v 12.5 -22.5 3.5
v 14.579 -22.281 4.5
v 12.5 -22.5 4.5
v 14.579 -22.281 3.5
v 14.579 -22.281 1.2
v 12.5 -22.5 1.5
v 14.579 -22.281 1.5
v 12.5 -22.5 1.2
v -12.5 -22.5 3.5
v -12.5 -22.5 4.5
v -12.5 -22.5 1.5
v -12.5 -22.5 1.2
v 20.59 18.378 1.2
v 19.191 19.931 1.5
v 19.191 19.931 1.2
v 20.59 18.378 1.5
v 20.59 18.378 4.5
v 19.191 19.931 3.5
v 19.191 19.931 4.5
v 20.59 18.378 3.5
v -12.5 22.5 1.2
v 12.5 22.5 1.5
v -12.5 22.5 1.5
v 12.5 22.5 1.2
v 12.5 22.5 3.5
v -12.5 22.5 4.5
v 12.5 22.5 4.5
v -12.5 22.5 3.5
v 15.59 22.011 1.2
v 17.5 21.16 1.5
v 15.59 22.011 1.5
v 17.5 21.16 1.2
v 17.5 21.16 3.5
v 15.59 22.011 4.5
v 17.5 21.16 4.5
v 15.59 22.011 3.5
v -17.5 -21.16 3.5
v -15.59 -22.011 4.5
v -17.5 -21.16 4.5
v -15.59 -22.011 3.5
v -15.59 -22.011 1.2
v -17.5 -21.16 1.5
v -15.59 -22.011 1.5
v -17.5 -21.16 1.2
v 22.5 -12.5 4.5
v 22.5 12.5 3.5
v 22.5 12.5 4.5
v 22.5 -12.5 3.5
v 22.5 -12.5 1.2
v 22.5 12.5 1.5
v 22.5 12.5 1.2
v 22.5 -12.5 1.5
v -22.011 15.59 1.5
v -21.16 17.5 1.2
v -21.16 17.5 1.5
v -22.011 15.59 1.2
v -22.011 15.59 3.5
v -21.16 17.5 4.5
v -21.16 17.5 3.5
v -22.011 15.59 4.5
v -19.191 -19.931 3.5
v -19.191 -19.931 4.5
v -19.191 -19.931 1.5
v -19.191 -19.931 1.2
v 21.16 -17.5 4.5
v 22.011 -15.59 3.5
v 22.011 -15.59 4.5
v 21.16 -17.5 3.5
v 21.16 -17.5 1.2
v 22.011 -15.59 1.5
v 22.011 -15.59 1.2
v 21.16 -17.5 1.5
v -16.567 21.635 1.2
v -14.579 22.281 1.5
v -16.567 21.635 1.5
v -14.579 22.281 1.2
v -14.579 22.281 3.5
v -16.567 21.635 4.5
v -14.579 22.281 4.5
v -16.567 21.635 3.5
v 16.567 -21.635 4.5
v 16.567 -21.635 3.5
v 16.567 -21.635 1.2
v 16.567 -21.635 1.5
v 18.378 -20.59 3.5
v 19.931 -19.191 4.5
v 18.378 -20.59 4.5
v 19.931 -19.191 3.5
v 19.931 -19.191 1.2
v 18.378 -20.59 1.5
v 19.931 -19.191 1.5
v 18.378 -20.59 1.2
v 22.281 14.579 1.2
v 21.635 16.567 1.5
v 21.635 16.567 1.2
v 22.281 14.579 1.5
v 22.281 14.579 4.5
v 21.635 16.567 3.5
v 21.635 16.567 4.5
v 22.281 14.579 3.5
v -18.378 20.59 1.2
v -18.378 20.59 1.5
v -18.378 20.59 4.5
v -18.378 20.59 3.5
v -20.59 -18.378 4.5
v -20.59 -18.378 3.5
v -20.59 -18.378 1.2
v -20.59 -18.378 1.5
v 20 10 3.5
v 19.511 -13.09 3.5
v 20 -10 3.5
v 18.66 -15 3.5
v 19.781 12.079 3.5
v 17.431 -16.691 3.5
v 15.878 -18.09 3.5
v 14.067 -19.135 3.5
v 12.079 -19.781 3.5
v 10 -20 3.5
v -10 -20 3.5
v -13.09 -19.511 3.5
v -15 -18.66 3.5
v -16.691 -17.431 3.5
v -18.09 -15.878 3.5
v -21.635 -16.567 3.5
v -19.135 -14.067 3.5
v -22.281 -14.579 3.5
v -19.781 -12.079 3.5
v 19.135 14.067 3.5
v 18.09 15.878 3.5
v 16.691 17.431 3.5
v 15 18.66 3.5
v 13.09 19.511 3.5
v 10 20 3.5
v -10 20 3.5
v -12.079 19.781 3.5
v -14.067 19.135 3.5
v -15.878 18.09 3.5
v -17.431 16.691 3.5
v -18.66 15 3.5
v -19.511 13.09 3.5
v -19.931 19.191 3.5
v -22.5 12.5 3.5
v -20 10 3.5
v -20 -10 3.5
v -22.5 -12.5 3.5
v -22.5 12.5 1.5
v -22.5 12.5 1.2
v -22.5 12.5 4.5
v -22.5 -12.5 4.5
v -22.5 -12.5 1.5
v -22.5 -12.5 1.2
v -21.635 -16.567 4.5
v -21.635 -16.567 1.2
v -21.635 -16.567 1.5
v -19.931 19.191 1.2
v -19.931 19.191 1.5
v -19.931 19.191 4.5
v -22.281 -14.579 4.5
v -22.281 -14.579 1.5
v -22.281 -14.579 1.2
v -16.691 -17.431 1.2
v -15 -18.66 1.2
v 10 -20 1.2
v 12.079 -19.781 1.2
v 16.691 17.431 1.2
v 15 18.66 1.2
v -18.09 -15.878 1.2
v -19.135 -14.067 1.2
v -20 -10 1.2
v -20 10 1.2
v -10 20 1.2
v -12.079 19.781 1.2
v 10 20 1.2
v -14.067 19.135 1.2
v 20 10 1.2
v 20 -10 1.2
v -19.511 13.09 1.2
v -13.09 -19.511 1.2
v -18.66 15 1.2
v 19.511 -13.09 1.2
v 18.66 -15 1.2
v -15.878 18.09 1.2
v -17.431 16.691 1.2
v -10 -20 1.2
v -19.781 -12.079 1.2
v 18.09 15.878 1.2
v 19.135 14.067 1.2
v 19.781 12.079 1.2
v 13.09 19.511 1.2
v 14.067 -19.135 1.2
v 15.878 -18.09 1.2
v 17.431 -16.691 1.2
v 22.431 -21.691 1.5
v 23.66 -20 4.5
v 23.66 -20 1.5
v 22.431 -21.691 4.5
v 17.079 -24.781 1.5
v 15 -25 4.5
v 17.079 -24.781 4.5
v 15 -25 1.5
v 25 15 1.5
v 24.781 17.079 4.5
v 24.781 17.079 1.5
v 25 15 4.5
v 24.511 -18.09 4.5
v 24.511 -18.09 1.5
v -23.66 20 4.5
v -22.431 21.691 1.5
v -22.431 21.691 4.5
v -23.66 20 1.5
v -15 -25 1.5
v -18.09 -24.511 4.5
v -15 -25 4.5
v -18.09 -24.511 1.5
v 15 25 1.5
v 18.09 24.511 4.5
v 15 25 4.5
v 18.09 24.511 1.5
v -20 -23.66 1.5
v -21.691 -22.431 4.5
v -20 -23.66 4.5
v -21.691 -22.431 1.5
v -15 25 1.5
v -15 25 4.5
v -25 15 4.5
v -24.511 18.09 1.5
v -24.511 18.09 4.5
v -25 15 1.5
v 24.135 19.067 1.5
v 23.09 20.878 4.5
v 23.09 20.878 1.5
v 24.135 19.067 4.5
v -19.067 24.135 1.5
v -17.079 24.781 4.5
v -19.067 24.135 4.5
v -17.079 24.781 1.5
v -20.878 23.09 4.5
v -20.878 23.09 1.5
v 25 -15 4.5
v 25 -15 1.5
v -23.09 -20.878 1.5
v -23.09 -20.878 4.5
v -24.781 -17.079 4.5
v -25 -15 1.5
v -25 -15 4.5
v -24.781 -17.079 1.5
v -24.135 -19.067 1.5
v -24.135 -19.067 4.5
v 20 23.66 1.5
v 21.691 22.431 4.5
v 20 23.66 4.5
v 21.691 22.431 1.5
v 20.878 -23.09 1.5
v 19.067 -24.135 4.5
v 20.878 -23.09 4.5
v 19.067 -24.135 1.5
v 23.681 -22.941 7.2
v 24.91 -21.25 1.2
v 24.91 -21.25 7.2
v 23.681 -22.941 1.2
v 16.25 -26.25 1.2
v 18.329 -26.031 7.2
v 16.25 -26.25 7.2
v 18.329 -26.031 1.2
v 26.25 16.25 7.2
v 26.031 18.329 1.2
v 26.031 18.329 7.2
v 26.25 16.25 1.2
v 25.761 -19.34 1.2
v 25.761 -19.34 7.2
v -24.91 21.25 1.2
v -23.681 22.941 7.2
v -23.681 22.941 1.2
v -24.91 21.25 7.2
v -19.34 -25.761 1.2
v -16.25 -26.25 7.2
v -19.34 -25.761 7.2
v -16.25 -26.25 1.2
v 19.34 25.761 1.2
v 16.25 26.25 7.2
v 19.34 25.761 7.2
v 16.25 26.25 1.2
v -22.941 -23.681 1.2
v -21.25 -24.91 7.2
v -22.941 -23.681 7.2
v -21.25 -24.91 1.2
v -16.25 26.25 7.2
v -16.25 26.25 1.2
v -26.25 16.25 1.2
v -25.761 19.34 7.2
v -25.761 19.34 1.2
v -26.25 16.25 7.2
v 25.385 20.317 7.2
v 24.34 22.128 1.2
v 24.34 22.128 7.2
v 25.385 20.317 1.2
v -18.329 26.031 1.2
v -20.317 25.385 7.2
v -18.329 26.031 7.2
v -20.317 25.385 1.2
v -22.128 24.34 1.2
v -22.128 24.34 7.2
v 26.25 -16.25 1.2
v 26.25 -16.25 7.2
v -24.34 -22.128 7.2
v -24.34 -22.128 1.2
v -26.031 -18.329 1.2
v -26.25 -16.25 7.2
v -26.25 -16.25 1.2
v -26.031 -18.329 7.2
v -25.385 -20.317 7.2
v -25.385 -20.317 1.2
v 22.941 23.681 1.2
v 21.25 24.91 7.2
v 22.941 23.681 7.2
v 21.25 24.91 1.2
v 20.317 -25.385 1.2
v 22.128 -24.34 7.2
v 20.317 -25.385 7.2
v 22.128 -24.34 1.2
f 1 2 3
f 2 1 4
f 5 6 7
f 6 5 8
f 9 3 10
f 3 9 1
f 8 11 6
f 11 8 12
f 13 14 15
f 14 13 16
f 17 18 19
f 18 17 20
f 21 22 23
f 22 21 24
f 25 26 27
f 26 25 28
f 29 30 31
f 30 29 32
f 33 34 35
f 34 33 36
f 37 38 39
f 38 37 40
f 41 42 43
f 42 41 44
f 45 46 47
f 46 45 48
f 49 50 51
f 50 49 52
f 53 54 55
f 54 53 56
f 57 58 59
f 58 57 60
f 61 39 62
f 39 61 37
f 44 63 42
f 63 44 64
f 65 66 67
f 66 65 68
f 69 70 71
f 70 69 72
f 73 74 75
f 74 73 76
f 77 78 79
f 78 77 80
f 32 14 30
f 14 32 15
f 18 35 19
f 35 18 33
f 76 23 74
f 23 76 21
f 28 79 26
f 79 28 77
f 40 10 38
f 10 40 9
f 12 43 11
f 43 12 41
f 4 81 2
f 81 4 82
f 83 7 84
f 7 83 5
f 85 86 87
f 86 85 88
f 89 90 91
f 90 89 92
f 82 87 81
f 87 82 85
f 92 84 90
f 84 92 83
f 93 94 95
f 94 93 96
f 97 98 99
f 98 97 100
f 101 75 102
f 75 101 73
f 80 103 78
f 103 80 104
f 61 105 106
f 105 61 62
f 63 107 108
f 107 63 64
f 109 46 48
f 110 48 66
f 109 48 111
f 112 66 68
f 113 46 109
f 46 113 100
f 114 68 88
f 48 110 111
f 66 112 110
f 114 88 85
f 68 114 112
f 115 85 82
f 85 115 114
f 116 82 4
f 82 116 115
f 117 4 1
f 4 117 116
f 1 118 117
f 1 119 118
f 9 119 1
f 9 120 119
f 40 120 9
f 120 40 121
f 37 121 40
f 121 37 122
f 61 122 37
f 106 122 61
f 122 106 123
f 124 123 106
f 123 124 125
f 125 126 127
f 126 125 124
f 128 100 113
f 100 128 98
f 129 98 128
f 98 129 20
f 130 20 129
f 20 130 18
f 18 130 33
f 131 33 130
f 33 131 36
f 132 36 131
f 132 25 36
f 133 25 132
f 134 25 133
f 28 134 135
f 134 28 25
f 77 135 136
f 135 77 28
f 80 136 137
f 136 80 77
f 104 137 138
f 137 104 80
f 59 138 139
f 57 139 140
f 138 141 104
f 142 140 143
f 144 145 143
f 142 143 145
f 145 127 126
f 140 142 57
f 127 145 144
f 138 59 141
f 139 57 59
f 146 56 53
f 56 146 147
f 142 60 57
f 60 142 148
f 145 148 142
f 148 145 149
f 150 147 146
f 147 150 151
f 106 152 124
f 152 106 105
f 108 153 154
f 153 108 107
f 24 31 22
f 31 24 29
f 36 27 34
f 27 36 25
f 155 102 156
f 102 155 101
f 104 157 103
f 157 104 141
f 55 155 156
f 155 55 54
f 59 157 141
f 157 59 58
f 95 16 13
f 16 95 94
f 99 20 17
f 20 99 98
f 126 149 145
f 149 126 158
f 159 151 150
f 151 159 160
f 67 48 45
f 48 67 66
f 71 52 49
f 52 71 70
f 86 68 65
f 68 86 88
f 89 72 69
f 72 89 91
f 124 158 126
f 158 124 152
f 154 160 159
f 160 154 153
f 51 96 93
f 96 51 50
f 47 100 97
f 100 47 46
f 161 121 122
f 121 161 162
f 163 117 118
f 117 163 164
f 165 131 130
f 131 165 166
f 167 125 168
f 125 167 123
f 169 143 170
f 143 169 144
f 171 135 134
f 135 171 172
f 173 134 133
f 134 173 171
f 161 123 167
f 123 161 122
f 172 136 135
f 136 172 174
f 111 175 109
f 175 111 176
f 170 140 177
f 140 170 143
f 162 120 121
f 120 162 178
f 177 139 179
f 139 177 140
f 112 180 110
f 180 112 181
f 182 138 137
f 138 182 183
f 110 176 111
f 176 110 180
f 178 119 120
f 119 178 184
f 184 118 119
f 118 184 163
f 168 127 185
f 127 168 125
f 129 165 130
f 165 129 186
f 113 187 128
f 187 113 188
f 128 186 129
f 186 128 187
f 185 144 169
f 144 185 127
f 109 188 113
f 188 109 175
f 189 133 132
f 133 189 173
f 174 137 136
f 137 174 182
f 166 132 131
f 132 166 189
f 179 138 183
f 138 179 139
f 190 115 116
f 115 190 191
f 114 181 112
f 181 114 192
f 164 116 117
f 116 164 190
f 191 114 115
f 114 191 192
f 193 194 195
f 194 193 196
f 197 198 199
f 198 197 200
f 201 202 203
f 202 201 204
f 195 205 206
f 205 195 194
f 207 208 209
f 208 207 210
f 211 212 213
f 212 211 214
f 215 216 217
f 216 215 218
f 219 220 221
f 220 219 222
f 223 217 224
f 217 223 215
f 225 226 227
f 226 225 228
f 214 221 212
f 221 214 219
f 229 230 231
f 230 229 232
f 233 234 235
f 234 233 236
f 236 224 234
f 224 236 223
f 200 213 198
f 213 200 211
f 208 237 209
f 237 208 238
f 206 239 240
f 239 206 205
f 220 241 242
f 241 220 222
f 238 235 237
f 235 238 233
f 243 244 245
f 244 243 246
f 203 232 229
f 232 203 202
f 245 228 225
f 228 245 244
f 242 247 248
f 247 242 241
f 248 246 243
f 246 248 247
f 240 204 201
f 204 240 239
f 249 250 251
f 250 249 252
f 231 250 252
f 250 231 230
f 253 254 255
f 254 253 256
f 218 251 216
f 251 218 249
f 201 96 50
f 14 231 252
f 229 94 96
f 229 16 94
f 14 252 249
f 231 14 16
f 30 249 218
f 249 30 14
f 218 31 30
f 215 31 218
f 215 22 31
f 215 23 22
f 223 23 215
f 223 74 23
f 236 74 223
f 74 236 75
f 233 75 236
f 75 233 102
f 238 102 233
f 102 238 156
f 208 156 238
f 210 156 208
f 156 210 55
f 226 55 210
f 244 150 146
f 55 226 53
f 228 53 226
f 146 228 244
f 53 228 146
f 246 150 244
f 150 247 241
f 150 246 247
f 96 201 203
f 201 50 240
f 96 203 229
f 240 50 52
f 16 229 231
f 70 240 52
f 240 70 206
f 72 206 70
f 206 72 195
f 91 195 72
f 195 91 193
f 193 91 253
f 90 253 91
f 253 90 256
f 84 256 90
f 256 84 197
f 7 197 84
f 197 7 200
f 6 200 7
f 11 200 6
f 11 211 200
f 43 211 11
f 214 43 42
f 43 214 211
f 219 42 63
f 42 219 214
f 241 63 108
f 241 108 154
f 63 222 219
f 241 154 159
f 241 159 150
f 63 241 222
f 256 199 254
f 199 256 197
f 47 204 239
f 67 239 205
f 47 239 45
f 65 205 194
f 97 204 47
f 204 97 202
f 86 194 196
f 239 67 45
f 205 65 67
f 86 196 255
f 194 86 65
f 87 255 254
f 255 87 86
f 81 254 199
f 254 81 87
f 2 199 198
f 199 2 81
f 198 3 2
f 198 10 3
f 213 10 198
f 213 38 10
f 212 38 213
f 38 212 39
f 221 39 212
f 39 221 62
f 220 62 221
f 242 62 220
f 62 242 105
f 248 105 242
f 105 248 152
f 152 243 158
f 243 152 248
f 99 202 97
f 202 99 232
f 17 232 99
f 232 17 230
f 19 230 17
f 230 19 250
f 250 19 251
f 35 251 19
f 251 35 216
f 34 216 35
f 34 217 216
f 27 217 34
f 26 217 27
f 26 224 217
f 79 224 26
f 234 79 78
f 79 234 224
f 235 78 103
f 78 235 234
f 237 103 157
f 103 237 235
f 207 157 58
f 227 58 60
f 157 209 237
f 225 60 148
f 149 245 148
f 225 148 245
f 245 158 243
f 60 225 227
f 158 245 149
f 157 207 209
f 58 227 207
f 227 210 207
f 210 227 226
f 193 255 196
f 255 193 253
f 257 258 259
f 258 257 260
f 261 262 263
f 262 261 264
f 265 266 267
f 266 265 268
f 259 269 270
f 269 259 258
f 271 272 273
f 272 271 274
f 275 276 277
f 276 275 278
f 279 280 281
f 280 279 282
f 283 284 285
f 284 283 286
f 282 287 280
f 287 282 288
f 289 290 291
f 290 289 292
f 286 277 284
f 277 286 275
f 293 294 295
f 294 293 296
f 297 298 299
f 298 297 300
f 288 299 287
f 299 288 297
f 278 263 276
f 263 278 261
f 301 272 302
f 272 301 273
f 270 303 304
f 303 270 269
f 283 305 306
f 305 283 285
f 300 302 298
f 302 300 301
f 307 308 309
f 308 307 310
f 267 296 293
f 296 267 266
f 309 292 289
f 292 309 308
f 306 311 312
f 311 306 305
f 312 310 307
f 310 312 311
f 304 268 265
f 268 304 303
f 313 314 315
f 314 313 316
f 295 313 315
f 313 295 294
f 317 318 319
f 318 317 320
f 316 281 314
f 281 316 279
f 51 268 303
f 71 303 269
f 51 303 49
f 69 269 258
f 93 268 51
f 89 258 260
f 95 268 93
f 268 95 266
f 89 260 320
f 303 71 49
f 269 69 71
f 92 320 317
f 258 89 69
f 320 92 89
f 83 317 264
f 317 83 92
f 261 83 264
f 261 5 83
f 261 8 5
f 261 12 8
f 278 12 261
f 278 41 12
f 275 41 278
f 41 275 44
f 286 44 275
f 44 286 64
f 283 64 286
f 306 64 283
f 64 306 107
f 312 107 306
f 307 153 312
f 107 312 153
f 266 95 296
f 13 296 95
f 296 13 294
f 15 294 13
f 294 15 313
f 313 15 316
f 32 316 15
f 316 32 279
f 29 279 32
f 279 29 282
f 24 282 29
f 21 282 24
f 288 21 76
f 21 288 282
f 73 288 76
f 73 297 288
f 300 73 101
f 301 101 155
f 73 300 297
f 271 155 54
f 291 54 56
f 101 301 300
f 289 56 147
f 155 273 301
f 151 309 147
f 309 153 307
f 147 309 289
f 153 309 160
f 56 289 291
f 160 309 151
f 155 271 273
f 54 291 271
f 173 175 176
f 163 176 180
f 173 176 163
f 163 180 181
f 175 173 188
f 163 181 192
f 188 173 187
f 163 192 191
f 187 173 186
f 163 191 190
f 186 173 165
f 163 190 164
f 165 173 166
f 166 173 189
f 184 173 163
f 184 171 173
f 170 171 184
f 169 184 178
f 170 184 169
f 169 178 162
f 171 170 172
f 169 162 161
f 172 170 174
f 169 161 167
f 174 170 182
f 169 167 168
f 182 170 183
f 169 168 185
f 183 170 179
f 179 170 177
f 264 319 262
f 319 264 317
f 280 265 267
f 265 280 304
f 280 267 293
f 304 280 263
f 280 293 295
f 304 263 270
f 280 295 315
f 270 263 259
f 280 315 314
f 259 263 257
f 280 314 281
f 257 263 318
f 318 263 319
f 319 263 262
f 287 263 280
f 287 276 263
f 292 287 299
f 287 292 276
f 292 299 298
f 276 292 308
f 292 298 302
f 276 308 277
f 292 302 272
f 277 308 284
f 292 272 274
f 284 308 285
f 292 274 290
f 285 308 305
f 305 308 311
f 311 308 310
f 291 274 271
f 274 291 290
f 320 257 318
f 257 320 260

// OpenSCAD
/*
 * Test for a stamp mold
 *
 * This one is not a mold, it is the stamp itself.
 */
echo(version=version());

logo = "resist.png"; // res 354 x 355
logox = 354; 
logoy = 355; 

module roundedRect(size, radius) {  
	linear_extrude(height=size.z, center=true) {
		offset(radius) offset(-radius) {
			square([size.x, size.y], center = true);
		}
	}
}

// Base plate
// ----------
plateWidth = 50;
plateLength = 50;
plateThickNess = 3;
cornerRadius = 10;

difference() {
  // The plate
  translate([0, 0, 1.4 * plateThickNess]) {
    color("green") {
      roundedRect([plateWidth * 1.05, plateLength * 1.05, plateThickNess * 2], cornerRadius);
    }
  }
  // The "mold"
  difference() {  
    union() {
      difference() {
        //roundedRect([plateWidth, plateLength, plateThickNess], cornerRadius);
        translate([0, 0, 2]) {
          scale([.9 * plateWidth / logox, .9 * plateWidth / logoy, .02]) {
            color("white") {
              rotate([0, 0, -90]) {
                surface(file=logo, invert=true, center=true);
              }
            }
          }
          // the groove around the picture
          difference() {
            roundedRect([plateWidth -  5, plateLength -  5, plateThickNess], cornerRadius);
            roundedRect([plateWidth - 10, plateLength - 10, plateThickNess * 1.1], cornerRadius);
          }
        }
      }
      // The frame
      translate([0, 0, (plateThickNess / 1)]) {
        difference() {
          roundedRect([plateWidth, plateLength, plateThickNess], cornerRadius);
          roundedRect([plateWidth - 5, plateLength - 5, plateThickNess * 1.1], cornerRadius);
        }
      }
    }
  }
}
